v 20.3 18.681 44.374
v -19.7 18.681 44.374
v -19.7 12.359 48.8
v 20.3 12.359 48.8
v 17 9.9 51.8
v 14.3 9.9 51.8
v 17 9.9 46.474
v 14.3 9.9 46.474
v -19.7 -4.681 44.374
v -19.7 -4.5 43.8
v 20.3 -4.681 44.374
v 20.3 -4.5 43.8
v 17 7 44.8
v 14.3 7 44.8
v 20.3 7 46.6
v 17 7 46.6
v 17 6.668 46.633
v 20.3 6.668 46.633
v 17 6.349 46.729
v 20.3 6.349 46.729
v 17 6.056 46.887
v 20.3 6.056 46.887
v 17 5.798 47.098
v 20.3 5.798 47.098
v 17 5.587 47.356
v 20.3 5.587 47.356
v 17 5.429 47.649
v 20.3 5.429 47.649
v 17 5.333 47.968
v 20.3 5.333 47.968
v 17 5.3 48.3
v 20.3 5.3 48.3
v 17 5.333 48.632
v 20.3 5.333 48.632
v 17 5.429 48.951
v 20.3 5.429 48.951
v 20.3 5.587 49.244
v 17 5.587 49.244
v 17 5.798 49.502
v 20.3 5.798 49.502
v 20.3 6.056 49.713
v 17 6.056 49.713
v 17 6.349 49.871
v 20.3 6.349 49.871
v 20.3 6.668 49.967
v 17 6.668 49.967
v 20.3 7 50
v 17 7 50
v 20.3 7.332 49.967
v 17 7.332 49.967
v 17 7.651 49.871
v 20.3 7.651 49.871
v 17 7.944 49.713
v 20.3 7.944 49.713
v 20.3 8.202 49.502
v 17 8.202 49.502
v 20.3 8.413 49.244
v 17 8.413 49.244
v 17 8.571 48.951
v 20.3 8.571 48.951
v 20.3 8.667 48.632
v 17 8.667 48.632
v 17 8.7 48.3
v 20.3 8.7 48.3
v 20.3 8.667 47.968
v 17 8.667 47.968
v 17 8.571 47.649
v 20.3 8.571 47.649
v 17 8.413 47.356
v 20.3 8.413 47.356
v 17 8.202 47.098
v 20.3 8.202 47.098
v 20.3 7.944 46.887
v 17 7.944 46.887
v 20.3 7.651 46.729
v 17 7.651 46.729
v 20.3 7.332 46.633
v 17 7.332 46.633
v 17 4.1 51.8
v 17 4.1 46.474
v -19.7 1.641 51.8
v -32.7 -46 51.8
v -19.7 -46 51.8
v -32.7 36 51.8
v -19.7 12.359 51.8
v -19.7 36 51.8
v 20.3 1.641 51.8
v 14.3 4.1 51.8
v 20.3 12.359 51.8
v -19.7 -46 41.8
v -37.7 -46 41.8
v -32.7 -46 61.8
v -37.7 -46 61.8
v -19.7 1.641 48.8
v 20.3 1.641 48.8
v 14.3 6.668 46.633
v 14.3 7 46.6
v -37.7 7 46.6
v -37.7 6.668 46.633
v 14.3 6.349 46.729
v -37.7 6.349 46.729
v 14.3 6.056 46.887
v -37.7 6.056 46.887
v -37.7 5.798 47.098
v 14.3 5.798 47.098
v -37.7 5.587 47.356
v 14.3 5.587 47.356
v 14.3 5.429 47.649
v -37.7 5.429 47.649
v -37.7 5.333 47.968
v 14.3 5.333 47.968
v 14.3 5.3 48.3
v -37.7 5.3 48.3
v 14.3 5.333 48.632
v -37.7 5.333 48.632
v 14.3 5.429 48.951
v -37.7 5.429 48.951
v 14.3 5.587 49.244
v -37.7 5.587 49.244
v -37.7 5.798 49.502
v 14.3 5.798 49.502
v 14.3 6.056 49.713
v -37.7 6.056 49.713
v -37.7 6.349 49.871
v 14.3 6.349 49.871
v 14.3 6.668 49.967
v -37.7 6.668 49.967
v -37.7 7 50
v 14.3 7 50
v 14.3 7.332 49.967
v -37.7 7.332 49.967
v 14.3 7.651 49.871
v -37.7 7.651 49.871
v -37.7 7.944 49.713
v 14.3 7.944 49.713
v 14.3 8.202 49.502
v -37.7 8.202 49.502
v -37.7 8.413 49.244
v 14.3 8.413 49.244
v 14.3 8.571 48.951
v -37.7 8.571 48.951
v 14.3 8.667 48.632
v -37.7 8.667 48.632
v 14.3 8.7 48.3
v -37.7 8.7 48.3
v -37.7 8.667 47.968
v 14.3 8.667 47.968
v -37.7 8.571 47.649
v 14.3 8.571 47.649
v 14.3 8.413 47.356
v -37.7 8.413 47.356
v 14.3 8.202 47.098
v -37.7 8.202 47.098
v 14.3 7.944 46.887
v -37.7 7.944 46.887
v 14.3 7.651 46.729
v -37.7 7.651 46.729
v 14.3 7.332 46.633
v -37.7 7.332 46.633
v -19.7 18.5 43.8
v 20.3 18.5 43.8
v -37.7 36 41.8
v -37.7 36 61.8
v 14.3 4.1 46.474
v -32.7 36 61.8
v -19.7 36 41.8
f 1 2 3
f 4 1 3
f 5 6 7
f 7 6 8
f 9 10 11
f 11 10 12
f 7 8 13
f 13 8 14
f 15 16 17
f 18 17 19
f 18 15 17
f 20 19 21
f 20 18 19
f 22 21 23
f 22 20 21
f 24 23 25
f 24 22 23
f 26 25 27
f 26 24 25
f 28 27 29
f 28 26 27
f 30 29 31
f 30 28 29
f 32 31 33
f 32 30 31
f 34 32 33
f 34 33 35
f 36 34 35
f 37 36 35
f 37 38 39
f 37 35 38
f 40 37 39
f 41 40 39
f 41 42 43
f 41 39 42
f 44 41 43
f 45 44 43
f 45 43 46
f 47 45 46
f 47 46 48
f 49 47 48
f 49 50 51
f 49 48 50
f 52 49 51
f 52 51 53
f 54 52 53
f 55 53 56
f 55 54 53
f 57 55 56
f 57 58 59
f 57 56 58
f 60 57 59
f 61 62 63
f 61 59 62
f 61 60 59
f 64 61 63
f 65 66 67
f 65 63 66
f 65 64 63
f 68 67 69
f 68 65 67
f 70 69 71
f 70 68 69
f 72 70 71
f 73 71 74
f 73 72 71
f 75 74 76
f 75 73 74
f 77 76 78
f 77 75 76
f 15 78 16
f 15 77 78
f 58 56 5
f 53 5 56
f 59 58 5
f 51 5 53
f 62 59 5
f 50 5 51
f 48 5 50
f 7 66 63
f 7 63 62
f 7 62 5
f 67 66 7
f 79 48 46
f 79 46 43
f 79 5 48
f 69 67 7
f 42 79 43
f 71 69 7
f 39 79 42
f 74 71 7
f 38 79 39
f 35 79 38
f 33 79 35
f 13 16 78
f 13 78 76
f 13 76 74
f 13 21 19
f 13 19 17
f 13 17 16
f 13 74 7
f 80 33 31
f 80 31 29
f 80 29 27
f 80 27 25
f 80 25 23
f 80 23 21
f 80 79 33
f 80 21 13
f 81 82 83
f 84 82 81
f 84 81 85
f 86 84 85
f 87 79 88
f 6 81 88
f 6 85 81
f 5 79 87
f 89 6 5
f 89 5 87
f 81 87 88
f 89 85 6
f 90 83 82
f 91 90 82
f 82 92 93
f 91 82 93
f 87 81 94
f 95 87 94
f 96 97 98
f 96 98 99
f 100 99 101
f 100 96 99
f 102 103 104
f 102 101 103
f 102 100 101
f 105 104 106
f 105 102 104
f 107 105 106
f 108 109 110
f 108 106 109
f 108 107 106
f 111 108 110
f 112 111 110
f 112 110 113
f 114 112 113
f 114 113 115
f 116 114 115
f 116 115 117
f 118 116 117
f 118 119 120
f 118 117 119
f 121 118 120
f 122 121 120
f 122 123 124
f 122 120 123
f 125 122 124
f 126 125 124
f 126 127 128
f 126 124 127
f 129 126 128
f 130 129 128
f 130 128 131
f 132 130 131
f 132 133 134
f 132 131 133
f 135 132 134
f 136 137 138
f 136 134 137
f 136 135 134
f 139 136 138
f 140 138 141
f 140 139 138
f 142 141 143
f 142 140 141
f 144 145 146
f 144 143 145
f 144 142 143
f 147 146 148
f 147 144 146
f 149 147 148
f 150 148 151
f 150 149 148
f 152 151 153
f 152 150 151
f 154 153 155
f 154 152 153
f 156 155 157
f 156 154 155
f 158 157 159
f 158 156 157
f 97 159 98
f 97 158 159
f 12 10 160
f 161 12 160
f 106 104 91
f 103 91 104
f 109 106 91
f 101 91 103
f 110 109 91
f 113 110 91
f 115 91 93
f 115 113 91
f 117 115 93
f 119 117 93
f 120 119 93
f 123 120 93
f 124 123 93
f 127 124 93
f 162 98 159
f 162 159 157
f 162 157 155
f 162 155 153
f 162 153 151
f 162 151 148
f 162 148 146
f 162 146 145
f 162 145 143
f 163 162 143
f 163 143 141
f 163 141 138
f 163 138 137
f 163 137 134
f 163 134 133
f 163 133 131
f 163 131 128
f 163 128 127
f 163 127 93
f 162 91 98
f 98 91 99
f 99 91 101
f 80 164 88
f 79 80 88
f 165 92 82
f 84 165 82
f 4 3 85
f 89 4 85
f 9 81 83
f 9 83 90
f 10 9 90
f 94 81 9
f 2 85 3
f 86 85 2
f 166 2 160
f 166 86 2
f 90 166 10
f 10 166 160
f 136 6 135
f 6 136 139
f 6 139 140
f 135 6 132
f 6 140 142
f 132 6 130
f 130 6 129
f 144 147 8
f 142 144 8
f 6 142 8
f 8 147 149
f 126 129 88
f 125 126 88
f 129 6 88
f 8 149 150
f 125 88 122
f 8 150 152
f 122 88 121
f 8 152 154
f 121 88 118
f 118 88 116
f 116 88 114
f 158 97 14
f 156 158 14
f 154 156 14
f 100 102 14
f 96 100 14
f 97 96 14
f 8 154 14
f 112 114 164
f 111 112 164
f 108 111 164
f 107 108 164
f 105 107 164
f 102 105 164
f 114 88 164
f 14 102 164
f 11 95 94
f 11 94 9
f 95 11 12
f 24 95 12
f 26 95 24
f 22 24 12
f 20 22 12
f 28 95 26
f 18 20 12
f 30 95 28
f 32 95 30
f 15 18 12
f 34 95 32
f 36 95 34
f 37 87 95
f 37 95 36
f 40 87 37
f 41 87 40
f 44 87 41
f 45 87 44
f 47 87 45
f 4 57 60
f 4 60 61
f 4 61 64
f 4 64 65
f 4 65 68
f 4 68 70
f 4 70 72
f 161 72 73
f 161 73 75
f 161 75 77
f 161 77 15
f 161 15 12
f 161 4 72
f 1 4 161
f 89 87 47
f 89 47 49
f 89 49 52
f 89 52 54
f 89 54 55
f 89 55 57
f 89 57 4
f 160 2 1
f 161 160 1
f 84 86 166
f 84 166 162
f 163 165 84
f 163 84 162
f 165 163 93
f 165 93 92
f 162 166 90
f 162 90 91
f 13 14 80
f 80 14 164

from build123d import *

# Parameters (mm, degrees)
PAD007_DEPTH               = 2.7
CYLINDER1015_R             = 1.7
CYLINDER1015_DEPTH         = 100
CLONE008_PITCH_ANGLE       = 90
PAD006_DEPTH               = 82
PAD009_DEPTH               = 40
CHAMFER011_SIZE            = 1
CHAMFER011_PLACEMENT_ANGLE = 180


with BuildPart() as clone_of_m3nuthousingmaster:
    # Sketch008 → Pad007 (new body)
    with BuildSketch(Plane(origin=(65, 30, 1.5), x_dir=(0, 0, 1), z_dir=(-1, 0, 0))):
        Polygon((0, 0), (1.674316, 2.9), (21.674316, 2.9), (21.674316, -2.9), (1.674316, -2.9), align=None)
    extrude(amount=PAD007_DEPTH)


with BuildPart() as clone_of_m3nuthousingmaster_1:
    # Clone009 placement: moved
    add(clone_of_m3nuthousingmaster.part.moved(Location((-117, -0.99996, 1.5))))


with BuildPart() as fusion021:
    # Cylinder1015 → Cylinder1015 (new body)
    with BuildSketch(Plane.XY):
        Circle(CYLINDER1015_R)
    extrude(amount=CYLINDER1015_DEPTH)


with BuildPart() as fusion021_1:
    # Clone008 pitch: moved
    add(fusion021.part.rotate(Axis((0, 0, 0), (0, 1, 0)), CLONE008_PITCH_ANGLE))


with BuildPart() as fusion021_2:
    # Clone008 placement: moved
    add(fusion021_1.part.moved(Location((-58, 29, 6.5))))

    # Fusion021: union Clone of M3NutHousingMaster
    add(clone_of_m3nuthousingmaster_1.part)


with BuildPart() as pad006:
    # Sketch007 → Pad006 (new body)
    with BuildSketch(Plane(origin=(0, 0, 0), x_dir=(-1, 0, 0), z_dir=(0, 1, 0))):
        Polygon((0, 0), (0, 20), (5, 20), (5, 10), (18, 10), (18, 0), align=None)
    extrude(amount=PAD006_DEPTH)


with BuildPart() as clone_of_lateraladjust:
    # Sketch010 → Pad009 (new body)
    with BuildSketch(Plane(origin=(-18, 29, 2), x_dir=(0, 1, 0), z_dir=(1, 0, 0))):
        Polygon((-12.5, 0), (-5.35926, 5), (-5.35926, 8), (5.35926, 8), (5.35926, 5), (12.5, 0), align=None)
    extrude(amount=-PAD009_DEPTH)

    # Fusion034: union Pad006
    add(pad006.part)

    # Cut025: cut Fusion021
    add(fusion021_2.part, mode=Mode.SUBTRACT)

    # Chamfer011
    chamfer011_edges = [clone_of_lateraladjust.edges().sort_by_distance(p)[0] for p in [
        (-38, 16.5, 2),
        (-38, 41.5, 2),
    ]]
    chamfer(chamfer011_edges, length=CHAMFER011_SIZE)


with BuildPart() as clone_of_lateraladjust_1:
    # Chamfer011 placement: moved
    add(clone_of_lateraladjust.part.moved(Location((-37.7, 79, 44))).rotate(Axis((-37.7, 79, 44), (0, 0, 1)), CHAMFER011_PLACEMENT_ANGLE))


with BuildPart() as clone_of_lateraladjust_2:
    # Clone088 placement: moved
    add(clone_of_lateraladjust_1.part.moved(Location((0, -43, -2.2))))


solid = clone_of_lateraladjust_2.part
